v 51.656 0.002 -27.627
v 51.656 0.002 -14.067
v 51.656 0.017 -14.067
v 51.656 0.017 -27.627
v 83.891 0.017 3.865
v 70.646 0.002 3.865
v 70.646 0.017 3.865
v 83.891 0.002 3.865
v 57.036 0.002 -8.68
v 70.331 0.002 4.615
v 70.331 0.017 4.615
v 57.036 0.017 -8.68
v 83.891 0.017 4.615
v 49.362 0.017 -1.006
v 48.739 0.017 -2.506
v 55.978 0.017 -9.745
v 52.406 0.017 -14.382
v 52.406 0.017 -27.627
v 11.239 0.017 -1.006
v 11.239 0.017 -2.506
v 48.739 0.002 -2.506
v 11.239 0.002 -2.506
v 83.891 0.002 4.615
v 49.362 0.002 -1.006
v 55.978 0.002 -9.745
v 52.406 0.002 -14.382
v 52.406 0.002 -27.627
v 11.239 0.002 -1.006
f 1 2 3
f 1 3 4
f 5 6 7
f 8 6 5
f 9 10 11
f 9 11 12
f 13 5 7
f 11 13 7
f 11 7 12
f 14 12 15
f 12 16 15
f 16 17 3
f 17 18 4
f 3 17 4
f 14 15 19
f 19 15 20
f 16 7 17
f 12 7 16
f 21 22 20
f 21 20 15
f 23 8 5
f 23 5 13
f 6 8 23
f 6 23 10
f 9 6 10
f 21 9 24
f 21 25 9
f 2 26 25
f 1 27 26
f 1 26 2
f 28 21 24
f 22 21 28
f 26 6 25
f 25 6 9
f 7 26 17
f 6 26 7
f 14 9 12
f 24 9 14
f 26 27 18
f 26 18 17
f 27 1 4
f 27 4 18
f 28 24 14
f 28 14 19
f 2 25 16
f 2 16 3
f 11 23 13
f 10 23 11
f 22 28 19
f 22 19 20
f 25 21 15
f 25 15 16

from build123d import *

# Parameters (mm, degrees)
BOSS_EXTRUDE1_DEPTH = 0.02
SCALE1_SCALE        = 0.75


with BuildPart() as part:
    # Sketch1 → Boss-Extrude1 (new body)
    with BuildSketch(Plane(origin=(0, 0, 0), x_dir=(1, 0, 0), z_dir=(0, 1, 0))):
        Polygon((0, 0), (0, 2), (50, 2), (59.652007563, 11.652007563), (53.889087297, 17.41492783), (53.889087297, 35.49492783), (54.889087297, 35.49492783), (54.889087297, 17.83492783), (79.209002128, -6.495331881), (96.869002128, -6.495331881), (96.869002128, -7.495331881), (78.789002128, -7.495331881), (61.061835124, 10.231835124), (50.83, 0), align=None)
    extrude(amount=BOSS_EXTRUDE1_DEPTH)


with BuildPart() as part_1:
    # Scale1: scaled about (44.956647526, 0.01, -4.024879093)
    add(part.part.scale(SCALE1_SCALE).moved(Location((11.239161881, 0.0025, -1.006219773))))


solid = part_1.part
